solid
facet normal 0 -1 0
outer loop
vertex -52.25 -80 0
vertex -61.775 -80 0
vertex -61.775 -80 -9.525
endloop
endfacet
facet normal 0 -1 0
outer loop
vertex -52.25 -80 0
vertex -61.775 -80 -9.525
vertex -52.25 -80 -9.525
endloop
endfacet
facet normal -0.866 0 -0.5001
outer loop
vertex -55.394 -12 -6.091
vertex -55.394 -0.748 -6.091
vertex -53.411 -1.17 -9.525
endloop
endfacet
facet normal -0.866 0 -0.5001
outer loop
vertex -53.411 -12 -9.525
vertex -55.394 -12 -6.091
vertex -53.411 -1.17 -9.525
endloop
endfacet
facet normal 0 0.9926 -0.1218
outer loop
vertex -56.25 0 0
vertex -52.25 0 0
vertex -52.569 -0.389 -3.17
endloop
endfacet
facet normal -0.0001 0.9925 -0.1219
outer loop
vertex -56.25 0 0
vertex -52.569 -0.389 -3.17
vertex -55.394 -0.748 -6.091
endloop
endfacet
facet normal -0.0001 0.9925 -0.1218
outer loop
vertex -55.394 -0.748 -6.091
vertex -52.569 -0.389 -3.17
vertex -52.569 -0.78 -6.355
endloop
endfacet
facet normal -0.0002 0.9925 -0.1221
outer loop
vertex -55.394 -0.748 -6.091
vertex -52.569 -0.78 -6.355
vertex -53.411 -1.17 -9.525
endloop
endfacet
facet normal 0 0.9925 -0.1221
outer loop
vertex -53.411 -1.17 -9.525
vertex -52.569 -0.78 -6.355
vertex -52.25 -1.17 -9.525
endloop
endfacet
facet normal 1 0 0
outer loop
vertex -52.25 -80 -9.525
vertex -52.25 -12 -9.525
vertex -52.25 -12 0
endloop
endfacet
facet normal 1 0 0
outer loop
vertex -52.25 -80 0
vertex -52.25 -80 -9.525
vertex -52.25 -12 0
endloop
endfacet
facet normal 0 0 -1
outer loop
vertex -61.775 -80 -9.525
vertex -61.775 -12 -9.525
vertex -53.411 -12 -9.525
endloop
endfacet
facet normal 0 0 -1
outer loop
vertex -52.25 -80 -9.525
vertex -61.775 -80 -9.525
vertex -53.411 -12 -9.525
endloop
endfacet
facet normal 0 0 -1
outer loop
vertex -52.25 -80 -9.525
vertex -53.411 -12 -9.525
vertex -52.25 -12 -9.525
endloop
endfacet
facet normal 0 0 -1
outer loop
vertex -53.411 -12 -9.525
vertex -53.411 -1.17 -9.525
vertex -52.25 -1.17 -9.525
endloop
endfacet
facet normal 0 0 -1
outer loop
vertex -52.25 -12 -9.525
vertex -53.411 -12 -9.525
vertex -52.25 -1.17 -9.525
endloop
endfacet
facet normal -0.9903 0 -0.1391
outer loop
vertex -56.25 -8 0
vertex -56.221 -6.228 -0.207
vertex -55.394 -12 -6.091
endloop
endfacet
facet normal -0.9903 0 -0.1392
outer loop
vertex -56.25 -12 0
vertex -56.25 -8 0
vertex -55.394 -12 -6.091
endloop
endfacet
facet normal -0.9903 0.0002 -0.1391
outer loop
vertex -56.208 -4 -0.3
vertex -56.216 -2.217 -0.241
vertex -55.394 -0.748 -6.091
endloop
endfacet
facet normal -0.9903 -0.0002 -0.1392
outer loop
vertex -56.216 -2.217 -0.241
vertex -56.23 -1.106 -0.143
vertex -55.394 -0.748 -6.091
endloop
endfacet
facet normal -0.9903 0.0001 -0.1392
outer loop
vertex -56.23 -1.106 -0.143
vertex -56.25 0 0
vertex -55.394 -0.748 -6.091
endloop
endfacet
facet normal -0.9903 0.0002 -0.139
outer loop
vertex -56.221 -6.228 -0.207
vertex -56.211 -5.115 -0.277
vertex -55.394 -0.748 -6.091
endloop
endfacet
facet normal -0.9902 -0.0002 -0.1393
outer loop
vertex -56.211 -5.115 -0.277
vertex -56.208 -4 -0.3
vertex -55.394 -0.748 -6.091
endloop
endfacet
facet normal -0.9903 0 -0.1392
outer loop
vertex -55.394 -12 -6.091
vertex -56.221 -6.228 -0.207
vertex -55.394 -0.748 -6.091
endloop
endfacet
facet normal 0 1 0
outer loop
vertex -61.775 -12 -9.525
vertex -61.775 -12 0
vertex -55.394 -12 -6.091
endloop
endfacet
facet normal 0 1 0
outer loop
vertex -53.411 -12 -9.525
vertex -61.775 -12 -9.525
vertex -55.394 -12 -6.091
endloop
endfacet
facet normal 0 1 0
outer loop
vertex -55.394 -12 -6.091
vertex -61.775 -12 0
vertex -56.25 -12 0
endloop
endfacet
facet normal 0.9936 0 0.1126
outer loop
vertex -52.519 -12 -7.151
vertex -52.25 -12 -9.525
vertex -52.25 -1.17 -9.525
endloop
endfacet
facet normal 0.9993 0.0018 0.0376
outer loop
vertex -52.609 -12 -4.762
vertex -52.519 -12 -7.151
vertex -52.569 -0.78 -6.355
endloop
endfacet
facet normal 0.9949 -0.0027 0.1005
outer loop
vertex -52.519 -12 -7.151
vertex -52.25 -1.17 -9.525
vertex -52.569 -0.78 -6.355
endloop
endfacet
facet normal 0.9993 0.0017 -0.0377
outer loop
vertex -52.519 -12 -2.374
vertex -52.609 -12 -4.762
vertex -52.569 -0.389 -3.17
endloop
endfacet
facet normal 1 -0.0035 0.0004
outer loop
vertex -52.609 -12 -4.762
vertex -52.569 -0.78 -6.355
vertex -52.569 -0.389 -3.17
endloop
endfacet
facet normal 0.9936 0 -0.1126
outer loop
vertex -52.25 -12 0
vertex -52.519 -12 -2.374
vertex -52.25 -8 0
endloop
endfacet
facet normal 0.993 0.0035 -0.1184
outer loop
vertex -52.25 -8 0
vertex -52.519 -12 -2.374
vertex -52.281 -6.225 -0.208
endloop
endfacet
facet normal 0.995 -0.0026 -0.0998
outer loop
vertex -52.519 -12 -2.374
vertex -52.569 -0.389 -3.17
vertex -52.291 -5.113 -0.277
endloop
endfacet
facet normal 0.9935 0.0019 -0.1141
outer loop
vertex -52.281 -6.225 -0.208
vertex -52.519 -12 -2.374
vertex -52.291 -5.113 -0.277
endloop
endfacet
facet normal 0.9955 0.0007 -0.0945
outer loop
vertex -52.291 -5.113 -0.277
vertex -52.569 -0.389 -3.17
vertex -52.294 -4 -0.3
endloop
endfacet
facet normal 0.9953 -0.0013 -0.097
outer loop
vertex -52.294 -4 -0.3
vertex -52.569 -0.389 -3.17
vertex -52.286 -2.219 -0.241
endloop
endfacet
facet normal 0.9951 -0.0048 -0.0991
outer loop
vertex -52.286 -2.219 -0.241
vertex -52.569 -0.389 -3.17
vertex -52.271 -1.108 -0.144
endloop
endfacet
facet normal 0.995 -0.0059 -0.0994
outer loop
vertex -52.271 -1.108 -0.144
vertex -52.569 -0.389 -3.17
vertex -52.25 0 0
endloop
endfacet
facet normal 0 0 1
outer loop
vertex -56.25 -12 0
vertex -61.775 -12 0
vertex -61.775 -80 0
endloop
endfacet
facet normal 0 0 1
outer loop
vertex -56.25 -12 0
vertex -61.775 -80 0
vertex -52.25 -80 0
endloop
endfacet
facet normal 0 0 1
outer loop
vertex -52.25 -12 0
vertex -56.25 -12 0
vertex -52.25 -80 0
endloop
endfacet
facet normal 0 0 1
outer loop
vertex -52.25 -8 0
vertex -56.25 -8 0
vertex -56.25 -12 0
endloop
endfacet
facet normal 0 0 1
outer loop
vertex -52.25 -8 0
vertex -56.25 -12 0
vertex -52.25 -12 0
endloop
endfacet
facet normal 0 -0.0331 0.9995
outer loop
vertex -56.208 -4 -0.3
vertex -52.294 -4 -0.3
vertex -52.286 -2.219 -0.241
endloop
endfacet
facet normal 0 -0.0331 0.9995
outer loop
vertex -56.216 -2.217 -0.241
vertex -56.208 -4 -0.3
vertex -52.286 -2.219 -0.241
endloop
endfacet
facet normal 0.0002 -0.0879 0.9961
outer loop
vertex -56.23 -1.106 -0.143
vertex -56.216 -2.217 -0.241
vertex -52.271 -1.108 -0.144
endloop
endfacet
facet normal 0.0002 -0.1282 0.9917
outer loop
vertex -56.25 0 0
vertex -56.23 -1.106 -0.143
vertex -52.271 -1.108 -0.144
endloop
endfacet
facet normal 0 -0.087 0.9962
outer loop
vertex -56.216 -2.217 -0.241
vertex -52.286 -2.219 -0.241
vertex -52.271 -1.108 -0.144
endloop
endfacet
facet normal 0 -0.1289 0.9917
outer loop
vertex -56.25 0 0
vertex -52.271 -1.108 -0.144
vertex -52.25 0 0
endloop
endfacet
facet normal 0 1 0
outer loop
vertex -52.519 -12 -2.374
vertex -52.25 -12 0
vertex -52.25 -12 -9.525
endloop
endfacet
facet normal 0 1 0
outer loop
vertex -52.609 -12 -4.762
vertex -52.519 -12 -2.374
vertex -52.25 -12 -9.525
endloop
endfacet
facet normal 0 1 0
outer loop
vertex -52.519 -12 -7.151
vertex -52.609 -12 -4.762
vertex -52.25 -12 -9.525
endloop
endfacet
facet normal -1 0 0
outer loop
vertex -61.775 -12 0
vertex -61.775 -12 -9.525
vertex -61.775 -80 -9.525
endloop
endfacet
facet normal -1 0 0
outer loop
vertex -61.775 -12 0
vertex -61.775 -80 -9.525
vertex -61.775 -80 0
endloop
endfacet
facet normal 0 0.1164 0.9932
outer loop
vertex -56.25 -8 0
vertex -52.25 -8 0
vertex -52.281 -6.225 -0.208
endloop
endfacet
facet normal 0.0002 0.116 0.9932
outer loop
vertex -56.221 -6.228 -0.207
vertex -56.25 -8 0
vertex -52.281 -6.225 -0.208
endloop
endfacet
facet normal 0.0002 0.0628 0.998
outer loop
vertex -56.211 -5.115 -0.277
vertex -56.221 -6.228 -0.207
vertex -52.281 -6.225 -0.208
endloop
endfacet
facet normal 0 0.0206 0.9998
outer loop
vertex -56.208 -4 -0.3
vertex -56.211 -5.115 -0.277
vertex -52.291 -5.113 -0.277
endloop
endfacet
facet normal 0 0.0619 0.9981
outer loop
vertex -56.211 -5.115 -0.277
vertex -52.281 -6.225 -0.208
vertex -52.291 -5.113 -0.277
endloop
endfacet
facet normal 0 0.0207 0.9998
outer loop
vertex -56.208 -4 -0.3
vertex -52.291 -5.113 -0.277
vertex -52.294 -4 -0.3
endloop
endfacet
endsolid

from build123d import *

# Parameters (mm, degrees)
F1_DEPTH = 12
F2_W     = 9.525
F2_H     = 9.525
F3_DEPTH = 68
F5_DEPTH = 57.25
F7_DEPTH = 57.25


with BuildPart() as f1:
    # F0 (on Front) → F1 (new body)
    with BuildSketch(Plane.XZ):
        with BuildLine():
            Line((-52.25, 0), (-56.25, 0))
            Line((-56.25, 0), (-55.3939646182, -6.0910082371))
            Line((-55.3939646182, -6.0910082371), (-53.4113485495, -9.525))
            Line((-53.4113485495, -9.525), (-52.25, -9.525))
            ThreePointArc((-52.25, -9.525), (-52.6092196059, -4.7625), (-52.25, 0))
        make_face()
    extrude(amount=F1_DEPTH)

    # F2 (on face) → F3 (join)
    with BuildSketch(Plane.XZ.offset(12)):
        with Locations((-57.0125, -4.7625)):
            Rectangle(F2_W, F2_H)
    extrude(amount=F3_DEPTH)

    # F4 (on Right) → F5 (cut, up to face)
    with BuildSketch(Plane.YZ):
        Polygon((0, -9.525), (0, 0), (-1.1695229426, -9.525), align=None)
    extrude(amount=-F5_DEPTH, mode=Mode.SUBTRACT)

    # F6 (on Right) → F7 (cut, up to face)
    with BuildSketch(Plane.YZ):
        with BuildLine():
            Line((-4, 0), (-8, 0))
            ThreePointArc((-8, 0), (-6.005617112, -0.2248948268), (-4, -0.3))
            Line((-4, -0.3), (-4, 0))
        make_face()
        with BuildLine():
            Line((0, 0), (-4, 0))
            Line((-4, 0), (-4, -0.3))
            ThreePointArc((-4, -0.3), (-1.994382888, -0.2248948268), (0, 0))
        make_face()
    extrude(amount=-F7_DEPTH, mode=Mode.SUBTRACT)


solid = f1.part
